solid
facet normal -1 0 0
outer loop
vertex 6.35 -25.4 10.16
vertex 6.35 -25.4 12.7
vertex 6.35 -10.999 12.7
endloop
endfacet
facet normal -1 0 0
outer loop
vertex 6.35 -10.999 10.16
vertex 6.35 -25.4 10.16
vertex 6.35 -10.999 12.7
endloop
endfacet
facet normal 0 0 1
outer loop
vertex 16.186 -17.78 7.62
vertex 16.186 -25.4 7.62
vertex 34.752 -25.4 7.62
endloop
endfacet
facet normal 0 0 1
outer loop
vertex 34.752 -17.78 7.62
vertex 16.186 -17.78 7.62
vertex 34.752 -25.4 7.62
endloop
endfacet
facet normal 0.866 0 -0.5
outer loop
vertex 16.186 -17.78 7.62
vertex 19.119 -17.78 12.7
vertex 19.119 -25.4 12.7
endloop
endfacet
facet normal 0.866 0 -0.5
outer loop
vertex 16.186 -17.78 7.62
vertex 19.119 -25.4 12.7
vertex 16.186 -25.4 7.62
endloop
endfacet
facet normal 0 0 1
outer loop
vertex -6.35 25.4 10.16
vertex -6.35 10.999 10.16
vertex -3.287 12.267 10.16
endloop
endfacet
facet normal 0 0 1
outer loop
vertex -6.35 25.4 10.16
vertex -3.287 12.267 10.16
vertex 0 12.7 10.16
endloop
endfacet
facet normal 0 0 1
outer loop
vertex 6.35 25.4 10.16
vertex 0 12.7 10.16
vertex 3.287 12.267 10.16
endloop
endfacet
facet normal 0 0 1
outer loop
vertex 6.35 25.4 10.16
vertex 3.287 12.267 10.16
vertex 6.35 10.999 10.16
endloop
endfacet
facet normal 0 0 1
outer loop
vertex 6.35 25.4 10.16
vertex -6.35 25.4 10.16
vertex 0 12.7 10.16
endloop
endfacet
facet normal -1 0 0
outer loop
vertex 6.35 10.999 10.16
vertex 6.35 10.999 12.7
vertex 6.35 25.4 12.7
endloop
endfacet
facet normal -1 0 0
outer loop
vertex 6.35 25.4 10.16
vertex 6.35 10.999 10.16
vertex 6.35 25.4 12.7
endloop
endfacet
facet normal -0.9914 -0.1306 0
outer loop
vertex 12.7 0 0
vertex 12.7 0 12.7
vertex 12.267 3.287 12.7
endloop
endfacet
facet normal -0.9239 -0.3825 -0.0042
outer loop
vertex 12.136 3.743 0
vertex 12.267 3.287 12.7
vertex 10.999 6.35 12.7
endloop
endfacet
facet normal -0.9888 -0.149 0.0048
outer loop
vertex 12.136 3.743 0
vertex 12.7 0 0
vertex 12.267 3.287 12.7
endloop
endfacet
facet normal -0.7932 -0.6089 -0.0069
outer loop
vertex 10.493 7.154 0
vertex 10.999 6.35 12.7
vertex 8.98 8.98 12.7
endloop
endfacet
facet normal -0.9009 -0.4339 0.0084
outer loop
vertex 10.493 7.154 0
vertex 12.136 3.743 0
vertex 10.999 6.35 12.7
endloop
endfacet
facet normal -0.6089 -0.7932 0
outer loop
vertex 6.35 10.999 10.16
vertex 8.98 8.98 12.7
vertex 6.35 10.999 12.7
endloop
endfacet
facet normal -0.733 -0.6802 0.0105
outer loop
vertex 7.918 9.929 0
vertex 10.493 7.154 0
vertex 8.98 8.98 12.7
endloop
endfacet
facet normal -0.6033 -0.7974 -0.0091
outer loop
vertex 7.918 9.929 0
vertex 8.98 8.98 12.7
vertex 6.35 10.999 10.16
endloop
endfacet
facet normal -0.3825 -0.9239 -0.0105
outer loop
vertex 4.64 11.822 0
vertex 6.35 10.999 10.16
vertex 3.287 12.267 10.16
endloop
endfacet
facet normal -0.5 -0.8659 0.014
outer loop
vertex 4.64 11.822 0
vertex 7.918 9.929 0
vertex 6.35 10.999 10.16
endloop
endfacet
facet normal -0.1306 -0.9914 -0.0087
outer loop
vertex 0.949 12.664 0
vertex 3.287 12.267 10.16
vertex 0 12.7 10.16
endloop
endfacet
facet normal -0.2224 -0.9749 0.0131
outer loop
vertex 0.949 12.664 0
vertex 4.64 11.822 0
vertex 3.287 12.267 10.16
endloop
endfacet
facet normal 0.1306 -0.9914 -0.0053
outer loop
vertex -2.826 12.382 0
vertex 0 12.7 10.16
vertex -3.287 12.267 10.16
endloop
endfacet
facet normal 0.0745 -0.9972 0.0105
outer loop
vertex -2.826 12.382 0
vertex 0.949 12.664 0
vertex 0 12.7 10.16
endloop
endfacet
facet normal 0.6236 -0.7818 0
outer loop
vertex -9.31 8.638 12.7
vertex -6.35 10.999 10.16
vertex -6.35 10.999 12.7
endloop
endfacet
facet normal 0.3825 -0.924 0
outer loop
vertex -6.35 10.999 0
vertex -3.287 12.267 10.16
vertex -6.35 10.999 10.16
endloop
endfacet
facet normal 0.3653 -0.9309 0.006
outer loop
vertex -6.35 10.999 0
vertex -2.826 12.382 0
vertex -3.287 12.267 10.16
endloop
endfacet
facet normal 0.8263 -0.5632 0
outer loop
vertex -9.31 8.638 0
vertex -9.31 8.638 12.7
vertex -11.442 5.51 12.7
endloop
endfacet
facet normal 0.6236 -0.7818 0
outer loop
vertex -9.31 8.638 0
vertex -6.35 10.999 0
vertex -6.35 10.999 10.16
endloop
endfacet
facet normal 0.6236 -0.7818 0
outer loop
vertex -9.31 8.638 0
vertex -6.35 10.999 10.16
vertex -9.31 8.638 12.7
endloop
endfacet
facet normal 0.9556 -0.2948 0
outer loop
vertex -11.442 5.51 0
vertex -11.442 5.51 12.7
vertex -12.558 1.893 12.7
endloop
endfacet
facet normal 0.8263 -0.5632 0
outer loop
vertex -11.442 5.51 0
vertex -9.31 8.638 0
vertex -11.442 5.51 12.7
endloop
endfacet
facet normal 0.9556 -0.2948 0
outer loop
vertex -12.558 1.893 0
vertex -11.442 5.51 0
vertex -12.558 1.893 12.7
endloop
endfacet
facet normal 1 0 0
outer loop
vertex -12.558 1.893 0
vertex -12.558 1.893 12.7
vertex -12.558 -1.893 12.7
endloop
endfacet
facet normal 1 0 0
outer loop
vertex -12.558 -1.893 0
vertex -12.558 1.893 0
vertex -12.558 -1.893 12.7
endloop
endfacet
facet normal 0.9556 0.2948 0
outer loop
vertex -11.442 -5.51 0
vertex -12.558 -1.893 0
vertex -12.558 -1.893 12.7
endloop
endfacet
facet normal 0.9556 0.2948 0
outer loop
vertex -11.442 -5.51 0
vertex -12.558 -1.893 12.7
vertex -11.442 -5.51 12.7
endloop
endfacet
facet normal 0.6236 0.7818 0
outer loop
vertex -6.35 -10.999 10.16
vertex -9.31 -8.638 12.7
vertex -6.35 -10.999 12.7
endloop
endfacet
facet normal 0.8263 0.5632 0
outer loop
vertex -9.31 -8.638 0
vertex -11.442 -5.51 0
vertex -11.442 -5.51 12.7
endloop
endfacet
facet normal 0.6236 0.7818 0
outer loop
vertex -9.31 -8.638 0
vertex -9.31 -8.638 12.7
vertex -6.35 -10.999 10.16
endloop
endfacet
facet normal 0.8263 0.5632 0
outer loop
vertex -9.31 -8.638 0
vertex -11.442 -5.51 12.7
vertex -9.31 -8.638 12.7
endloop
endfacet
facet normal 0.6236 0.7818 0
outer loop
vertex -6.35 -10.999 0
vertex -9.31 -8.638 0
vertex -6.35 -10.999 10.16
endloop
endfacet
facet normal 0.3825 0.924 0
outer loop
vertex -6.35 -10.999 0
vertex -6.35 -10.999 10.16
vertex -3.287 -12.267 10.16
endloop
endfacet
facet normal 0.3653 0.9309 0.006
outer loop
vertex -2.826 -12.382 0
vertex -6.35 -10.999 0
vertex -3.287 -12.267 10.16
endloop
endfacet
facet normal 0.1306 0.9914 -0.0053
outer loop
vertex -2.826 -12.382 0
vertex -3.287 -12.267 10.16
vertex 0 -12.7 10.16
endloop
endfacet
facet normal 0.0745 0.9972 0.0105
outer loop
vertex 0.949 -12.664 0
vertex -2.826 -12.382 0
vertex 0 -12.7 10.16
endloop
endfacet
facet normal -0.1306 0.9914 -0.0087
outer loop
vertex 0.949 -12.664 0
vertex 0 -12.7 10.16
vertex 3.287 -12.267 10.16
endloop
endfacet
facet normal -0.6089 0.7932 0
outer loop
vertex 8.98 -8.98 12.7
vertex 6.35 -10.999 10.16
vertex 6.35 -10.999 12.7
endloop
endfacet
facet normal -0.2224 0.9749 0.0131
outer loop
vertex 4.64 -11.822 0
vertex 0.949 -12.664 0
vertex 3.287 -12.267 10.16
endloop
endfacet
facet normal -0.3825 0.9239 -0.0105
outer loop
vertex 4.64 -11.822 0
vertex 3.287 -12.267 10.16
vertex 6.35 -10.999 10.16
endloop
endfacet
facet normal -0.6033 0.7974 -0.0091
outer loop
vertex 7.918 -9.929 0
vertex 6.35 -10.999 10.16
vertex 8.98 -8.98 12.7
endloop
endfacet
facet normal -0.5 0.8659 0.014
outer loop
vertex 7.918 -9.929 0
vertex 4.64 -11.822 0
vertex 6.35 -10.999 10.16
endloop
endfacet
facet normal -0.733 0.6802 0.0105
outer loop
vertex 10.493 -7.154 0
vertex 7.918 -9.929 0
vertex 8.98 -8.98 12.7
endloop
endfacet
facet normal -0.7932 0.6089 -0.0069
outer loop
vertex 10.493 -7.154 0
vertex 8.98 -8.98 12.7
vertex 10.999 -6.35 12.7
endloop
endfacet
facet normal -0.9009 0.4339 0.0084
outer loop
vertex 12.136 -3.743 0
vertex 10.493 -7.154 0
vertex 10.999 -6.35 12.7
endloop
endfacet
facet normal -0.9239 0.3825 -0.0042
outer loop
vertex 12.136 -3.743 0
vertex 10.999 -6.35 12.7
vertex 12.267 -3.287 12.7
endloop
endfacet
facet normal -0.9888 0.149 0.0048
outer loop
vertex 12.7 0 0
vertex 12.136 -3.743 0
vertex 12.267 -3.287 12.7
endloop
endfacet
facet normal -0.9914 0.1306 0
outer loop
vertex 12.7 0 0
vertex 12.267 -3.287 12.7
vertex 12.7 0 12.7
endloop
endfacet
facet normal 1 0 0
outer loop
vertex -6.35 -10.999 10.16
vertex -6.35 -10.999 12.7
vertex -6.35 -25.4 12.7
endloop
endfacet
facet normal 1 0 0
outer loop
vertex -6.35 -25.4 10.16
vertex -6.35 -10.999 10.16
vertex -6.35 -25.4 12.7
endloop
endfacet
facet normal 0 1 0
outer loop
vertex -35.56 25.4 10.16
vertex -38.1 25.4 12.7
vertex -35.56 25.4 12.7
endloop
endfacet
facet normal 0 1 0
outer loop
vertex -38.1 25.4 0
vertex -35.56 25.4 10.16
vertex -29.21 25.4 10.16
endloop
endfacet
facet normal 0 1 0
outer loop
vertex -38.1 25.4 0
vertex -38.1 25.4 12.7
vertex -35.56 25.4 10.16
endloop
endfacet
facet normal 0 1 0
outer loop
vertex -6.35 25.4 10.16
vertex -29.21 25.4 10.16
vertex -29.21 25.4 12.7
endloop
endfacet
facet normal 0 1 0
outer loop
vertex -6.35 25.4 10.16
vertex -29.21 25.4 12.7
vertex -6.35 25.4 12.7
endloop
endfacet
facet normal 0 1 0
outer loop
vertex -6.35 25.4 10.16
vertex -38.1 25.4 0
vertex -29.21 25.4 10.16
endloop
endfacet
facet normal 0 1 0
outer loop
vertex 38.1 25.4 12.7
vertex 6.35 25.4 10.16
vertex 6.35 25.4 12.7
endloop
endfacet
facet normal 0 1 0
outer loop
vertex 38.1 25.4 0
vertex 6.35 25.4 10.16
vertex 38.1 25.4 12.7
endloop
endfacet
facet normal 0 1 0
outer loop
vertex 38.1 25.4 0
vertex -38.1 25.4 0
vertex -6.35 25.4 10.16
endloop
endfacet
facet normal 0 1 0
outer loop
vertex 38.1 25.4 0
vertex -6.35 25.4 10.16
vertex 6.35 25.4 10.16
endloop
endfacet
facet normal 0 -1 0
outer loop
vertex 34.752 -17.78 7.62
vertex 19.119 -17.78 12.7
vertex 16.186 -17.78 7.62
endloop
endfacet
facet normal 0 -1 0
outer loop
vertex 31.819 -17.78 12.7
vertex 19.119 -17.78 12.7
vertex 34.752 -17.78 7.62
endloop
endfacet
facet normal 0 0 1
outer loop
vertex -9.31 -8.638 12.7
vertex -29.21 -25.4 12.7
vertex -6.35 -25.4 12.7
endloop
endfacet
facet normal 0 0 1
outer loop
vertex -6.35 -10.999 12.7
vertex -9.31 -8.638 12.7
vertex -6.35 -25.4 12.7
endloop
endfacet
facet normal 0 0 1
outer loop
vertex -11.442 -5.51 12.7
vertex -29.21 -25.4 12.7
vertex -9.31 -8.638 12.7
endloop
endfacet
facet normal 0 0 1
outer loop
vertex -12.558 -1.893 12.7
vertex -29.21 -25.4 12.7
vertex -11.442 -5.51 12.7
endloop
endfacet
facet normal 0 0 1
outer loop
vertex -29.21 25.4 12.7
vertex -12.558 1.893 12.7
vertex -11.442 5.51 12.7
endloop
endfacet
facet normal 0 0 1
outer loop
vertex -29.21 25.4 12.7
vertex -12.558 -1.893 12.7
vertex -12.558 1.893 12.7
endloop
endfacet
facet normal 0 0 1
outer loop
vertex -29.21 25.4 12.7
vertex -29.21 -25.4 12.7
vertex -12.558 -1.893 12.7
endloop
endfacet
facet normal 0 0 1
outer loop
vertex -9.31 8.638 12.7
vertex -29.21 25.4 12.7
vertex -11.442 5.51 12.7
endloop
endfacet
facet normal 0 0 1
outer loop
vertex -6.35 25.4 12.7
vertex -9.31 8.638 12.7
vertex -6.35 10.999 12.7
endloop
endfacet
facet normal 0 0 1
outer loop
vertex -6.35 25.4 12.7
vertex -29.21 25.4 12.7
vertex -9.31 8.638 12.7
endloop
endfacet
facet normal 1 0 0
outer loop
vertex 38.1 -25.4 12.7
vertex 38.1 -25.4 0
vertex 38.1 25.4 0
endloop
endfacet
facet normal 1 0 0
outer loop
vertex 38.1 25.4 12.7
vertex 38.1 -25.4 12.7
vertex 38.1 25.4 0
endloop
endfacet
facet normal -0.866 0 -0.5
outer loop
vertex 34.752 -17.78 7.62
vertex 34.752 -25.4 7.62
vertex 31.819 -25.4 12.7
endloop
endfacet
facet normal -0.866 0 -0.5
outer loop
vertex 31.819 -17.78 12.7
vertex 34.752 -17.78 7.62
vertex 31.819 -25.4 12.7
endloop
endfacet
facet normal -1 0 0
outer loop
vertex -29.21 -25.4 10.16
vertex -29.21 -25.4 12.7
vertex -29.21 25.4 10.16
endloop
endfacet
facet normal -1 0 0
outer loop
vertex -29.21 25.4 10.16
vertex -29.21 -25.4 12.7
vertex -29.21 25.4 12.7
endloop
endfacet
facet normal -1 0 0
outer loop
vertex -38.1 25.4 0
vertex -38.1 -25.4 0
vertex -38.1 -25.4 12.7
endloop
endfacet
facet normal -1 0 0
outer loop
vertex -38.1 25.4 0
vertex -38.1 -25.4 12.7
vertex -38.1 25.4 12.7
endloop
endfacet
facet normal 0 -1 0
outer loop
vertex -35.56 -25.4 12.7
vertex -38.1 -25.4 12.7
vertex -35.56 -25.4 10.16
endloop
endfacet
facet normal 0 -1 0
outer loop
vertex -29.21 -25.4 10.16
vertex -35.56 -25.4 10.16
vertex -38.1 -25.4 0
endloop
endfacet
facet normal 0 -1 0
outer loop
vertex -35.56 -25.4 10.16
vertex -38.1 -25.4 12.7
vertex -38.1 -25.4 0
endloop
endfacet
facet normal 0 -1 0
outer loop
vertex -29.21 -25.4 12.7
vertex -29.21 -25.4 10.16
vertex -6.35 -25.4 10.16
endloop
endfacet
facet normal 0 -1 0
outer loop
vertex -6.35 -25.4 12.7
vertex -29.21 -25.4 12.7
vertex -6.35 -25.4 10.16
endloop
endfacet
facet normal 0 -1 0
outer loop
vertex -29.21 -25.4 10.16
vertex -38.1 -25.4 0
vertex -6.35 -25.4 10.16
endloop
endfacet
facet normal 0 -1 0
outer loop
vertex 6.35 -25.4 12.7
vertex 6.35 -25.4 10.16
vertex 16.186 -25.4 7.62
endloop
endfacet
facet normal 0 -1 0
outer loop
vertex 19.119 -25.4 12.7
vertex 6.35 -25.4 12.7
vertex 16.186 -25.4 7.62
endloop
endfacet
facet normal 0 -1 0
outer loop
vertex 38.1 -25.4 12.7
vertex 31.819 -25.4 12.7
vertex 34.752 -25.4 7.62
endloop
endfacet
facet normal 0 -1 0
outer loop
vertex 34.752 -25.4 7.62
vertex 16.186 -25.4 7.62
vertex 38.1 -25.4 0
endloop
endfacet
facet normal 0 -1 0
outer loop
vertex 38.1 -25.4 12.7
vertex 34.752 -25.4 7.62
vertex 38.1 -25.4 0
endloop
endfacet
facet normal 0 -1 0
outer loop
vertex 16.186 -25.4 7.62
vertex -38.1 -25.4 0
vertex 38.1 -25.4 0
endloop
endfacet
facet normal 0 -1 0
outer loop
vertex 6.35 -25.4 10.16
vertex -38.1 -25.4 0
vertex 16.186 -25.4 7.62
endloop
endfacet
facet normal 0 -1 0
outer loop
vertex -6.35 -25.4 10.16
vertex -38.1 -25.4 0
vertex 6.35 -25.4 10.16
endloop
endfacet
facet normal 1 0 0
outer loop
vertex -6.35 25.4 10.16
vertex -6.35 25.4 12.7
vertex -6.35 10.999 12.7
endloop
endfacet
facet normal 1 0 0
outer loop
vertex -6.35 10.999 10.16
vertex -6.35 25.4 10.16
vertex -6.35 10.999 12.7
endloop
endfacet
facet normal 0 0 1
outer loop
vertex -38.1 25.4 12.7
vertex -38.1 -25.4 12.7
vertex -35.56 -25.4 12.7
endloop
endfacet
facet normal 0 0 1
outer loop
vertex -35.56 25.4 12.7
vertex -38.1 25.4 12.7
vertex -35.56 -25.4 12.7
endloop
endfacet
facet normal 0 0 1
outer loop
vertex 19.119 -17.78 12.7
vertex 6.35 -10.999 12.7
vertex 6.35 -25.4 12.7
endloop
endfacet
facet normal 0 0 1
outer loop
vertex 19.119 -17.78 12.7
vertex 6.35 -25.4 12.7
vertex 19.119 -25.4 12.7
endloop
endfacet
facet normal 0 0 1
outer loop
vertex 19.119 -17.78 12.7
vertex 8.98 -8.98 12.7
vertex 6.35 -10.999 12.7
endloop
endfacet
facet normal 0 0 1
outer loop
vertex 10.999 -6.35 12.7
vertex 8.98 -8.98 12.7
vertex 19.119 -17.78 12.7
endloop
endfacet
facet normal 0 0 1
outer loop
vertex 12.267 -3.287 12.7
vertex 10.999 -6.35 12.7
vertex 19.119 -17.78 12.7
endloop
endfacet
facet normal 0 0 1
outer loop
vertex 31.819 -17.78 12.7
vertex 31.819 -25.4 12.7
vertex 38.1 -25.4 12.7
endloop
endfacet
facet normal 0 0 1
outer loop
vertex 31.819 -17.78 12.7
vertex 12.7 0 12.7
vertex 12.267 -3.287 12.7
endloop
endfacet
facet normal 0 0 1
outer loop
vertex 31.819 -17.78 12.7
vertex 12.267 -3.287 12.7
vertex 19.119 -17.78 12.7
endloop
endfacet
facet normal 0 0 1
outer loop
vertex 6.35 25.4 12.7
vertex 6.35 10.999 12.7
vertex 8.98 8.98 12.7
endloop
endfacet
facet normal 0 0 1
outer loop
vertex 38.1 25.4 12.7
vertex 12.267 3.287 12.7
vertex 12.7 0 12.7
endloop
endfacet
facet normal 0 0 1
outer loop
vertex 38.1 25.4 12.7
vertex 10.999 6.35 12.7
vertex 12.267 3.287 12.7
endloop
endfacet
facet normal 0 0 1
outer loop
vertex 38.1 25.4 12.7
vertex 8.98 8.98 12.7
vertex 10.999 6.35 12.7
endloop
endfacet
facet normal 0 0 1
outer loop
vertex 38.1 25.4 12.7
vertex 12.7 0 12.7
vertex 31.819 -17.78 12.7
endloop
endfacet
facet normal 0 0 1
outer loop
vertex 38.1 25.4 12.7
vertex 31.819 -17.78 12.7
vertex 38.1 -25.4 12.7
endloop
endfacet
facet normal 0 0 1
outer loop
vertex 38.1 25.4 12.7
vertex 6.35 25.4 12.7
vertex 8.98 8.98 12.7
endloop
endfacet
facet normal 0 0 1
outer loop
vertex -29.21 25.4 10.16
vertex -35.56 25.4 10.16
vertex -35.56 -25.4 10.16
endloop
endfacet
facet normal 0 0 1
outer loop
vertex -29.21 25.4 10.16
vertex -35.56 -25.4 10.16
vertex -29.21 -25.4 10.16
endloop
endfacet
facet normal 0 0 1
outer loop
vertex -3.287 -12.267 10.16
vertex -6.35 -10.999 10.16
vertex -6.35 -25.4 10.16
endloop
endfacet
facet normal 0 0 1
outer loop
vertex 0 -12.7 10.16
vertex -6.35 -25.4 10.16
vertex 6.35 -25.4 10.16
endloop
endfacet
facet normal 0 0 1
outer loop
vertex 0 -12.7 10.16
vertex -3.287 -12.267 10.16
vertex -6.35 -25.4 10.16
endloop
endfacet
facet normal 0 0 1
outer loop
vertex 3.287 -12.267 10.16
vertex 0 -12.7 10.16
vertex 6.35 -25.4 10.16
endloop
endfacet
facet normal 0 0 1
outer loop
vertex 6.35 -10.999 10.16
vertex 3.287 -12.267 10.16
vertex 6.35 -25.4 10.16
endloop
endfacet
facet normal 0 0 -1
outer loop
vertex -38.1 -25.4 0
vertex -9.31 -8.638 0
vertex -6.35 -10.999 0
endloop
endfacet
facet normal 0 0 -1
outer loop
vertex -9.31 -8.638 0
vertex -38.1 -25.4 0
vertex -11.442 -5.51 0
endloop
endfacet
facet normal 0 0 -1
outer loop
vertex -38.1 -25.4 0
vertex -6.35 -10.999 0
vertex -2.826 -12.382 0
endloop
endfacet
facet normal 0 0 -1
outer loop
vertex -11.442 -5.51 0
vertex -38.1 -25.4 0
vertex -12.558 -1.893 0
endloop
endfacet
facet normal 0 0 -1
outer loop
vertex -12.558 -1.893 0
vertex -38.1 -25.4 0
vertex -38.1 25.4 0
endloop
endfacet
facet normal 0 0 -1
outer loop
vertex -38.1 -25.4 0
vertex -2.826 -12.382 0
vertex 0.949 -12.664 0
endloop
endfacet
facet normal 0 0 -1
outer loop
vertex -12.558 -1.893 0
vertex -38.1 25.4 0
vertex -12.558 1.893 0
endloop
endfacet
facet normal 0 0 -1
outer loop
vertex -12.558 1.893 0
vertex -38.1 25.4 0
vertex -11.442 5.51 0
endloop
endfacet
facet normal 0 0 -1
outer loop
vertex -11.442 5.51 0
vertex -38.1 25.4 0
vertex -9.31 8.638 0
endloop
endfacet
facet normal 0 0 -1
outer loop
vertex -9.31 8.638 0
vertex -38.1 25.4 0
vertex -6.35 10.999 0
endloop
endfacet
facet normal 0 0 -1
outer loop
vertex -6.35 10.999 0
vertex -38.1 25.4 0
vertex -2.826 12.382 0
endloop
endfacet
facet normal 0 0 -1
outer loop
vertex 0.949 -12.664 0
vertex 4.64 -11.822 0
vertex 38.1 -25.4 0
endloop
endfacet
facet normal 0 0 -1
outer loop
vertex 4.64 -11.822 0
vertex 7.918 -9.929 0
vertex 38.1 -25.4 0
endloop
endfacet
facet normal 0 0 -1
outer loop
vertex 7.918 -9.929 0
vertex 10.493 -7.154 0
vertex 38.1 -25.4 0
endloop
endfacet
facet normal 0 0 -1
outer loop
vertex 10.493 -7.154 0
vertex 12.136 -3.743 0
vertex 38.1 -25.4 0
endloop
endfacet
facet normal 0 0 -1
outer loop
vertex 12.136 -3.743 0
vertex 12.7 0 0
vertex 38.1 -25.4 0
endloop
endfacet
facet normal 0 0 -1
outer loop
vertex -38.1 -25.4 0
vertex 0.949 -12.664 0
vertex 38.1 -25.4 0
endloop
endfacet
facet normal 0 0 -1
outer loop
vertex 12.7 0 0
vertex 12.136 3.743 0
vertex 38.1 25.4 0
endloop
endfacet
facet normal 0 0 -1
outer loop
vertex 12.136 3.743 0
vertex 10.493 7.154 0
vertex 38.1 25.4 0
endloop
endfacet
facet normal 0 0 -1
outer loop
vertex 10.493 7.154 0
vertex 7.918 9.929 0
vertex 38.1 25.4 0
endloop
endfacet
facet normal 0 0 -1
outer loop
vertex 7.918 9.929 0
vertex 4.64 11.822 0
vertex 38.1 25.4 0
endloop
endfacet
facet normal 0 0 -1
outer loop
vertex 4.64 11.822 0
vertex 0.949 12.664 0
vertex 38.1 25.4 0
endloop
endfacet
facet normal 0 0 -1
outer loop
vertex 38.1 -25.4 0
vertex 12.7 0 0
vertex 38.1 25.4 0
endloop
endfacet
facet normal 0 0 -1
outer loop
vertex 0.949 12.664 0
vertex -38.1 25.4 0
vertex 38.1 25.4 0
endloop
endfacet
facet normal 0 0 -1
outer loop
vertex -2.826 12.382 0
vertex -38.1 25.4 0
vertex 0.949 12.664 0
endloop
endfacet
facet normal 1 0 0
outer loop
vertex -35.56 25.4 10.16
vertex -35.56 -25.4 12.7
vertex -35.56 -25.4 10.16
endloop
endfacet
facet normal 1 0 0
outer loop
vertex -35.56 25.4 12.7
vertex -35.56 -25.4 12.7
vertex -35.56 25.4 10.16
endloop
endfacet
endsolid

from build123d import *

# Parameters (mm, degrees)
F0_W     = 76.2
F0_H     = 50.8
F0_R     = 12.7
F1_DEPTH = 12.7
F2_W     = 6.35
F2_H     = 50.8
F3_DEPTH = 2.54
F5_DEPTH = 7.62


with BuildPart() as f1:
    # F0 (on Top) → F1 (new body)
    with BuildSketch(Plane.XY):
        Rectangle(F0_W, F0_H)
        Circle(F0_R, mode=Mode.SUBTRACT)
    extrude(amount=F1_DEPTH)

    # F2 (on face) → F3 (cut)
    with BuildSketch(Plane.XY.offset(12.7)):
        with Locations((-32.385, 0)):
            Rectangle(F2_W, F2_H)
        with BuildLine():
            Line((6.35, 25.4), (-6.35, 25.4))
            Line((-6.35, 25.4), (-6.35, 10.9985226281))
            ThreePointArc((-6.35, 10.9985226281), (0, 12.7), (6.35, 10.9985226281))
            Line((6.35, 10.9985226281), (6.35, 25.4))
        make_face()
        with BuildLine():
            Line((-6.35, -10.9985226281), (-6.35, -25.4))
            Line((-6.35, -25.4), (6.35, -25.4))
            Line((6.35, -25.4), (6.35, -10.9985226281))
            ThreePointArc((6.35, -10.9985226281), (0, -12.7), (-6.35, -10.9985226281))
        make_face()
    extrude(amount=-F3_DEPTH, mode=Mode.SUBTRACT)

    # F4 (on face) → F5 (cut)
    with BuildSketch(Plane.XZ.offset(25.4)):
        Polygon((31.8187926716, 12.7), (19.1187926716, 12.7), (16.1858533041, 7.62), (34.7517320391, 7.62), align=None)
    extrude(amount=-F5_DEPTH, mode=Mode.SUBTRACT)


solid = f1.part
